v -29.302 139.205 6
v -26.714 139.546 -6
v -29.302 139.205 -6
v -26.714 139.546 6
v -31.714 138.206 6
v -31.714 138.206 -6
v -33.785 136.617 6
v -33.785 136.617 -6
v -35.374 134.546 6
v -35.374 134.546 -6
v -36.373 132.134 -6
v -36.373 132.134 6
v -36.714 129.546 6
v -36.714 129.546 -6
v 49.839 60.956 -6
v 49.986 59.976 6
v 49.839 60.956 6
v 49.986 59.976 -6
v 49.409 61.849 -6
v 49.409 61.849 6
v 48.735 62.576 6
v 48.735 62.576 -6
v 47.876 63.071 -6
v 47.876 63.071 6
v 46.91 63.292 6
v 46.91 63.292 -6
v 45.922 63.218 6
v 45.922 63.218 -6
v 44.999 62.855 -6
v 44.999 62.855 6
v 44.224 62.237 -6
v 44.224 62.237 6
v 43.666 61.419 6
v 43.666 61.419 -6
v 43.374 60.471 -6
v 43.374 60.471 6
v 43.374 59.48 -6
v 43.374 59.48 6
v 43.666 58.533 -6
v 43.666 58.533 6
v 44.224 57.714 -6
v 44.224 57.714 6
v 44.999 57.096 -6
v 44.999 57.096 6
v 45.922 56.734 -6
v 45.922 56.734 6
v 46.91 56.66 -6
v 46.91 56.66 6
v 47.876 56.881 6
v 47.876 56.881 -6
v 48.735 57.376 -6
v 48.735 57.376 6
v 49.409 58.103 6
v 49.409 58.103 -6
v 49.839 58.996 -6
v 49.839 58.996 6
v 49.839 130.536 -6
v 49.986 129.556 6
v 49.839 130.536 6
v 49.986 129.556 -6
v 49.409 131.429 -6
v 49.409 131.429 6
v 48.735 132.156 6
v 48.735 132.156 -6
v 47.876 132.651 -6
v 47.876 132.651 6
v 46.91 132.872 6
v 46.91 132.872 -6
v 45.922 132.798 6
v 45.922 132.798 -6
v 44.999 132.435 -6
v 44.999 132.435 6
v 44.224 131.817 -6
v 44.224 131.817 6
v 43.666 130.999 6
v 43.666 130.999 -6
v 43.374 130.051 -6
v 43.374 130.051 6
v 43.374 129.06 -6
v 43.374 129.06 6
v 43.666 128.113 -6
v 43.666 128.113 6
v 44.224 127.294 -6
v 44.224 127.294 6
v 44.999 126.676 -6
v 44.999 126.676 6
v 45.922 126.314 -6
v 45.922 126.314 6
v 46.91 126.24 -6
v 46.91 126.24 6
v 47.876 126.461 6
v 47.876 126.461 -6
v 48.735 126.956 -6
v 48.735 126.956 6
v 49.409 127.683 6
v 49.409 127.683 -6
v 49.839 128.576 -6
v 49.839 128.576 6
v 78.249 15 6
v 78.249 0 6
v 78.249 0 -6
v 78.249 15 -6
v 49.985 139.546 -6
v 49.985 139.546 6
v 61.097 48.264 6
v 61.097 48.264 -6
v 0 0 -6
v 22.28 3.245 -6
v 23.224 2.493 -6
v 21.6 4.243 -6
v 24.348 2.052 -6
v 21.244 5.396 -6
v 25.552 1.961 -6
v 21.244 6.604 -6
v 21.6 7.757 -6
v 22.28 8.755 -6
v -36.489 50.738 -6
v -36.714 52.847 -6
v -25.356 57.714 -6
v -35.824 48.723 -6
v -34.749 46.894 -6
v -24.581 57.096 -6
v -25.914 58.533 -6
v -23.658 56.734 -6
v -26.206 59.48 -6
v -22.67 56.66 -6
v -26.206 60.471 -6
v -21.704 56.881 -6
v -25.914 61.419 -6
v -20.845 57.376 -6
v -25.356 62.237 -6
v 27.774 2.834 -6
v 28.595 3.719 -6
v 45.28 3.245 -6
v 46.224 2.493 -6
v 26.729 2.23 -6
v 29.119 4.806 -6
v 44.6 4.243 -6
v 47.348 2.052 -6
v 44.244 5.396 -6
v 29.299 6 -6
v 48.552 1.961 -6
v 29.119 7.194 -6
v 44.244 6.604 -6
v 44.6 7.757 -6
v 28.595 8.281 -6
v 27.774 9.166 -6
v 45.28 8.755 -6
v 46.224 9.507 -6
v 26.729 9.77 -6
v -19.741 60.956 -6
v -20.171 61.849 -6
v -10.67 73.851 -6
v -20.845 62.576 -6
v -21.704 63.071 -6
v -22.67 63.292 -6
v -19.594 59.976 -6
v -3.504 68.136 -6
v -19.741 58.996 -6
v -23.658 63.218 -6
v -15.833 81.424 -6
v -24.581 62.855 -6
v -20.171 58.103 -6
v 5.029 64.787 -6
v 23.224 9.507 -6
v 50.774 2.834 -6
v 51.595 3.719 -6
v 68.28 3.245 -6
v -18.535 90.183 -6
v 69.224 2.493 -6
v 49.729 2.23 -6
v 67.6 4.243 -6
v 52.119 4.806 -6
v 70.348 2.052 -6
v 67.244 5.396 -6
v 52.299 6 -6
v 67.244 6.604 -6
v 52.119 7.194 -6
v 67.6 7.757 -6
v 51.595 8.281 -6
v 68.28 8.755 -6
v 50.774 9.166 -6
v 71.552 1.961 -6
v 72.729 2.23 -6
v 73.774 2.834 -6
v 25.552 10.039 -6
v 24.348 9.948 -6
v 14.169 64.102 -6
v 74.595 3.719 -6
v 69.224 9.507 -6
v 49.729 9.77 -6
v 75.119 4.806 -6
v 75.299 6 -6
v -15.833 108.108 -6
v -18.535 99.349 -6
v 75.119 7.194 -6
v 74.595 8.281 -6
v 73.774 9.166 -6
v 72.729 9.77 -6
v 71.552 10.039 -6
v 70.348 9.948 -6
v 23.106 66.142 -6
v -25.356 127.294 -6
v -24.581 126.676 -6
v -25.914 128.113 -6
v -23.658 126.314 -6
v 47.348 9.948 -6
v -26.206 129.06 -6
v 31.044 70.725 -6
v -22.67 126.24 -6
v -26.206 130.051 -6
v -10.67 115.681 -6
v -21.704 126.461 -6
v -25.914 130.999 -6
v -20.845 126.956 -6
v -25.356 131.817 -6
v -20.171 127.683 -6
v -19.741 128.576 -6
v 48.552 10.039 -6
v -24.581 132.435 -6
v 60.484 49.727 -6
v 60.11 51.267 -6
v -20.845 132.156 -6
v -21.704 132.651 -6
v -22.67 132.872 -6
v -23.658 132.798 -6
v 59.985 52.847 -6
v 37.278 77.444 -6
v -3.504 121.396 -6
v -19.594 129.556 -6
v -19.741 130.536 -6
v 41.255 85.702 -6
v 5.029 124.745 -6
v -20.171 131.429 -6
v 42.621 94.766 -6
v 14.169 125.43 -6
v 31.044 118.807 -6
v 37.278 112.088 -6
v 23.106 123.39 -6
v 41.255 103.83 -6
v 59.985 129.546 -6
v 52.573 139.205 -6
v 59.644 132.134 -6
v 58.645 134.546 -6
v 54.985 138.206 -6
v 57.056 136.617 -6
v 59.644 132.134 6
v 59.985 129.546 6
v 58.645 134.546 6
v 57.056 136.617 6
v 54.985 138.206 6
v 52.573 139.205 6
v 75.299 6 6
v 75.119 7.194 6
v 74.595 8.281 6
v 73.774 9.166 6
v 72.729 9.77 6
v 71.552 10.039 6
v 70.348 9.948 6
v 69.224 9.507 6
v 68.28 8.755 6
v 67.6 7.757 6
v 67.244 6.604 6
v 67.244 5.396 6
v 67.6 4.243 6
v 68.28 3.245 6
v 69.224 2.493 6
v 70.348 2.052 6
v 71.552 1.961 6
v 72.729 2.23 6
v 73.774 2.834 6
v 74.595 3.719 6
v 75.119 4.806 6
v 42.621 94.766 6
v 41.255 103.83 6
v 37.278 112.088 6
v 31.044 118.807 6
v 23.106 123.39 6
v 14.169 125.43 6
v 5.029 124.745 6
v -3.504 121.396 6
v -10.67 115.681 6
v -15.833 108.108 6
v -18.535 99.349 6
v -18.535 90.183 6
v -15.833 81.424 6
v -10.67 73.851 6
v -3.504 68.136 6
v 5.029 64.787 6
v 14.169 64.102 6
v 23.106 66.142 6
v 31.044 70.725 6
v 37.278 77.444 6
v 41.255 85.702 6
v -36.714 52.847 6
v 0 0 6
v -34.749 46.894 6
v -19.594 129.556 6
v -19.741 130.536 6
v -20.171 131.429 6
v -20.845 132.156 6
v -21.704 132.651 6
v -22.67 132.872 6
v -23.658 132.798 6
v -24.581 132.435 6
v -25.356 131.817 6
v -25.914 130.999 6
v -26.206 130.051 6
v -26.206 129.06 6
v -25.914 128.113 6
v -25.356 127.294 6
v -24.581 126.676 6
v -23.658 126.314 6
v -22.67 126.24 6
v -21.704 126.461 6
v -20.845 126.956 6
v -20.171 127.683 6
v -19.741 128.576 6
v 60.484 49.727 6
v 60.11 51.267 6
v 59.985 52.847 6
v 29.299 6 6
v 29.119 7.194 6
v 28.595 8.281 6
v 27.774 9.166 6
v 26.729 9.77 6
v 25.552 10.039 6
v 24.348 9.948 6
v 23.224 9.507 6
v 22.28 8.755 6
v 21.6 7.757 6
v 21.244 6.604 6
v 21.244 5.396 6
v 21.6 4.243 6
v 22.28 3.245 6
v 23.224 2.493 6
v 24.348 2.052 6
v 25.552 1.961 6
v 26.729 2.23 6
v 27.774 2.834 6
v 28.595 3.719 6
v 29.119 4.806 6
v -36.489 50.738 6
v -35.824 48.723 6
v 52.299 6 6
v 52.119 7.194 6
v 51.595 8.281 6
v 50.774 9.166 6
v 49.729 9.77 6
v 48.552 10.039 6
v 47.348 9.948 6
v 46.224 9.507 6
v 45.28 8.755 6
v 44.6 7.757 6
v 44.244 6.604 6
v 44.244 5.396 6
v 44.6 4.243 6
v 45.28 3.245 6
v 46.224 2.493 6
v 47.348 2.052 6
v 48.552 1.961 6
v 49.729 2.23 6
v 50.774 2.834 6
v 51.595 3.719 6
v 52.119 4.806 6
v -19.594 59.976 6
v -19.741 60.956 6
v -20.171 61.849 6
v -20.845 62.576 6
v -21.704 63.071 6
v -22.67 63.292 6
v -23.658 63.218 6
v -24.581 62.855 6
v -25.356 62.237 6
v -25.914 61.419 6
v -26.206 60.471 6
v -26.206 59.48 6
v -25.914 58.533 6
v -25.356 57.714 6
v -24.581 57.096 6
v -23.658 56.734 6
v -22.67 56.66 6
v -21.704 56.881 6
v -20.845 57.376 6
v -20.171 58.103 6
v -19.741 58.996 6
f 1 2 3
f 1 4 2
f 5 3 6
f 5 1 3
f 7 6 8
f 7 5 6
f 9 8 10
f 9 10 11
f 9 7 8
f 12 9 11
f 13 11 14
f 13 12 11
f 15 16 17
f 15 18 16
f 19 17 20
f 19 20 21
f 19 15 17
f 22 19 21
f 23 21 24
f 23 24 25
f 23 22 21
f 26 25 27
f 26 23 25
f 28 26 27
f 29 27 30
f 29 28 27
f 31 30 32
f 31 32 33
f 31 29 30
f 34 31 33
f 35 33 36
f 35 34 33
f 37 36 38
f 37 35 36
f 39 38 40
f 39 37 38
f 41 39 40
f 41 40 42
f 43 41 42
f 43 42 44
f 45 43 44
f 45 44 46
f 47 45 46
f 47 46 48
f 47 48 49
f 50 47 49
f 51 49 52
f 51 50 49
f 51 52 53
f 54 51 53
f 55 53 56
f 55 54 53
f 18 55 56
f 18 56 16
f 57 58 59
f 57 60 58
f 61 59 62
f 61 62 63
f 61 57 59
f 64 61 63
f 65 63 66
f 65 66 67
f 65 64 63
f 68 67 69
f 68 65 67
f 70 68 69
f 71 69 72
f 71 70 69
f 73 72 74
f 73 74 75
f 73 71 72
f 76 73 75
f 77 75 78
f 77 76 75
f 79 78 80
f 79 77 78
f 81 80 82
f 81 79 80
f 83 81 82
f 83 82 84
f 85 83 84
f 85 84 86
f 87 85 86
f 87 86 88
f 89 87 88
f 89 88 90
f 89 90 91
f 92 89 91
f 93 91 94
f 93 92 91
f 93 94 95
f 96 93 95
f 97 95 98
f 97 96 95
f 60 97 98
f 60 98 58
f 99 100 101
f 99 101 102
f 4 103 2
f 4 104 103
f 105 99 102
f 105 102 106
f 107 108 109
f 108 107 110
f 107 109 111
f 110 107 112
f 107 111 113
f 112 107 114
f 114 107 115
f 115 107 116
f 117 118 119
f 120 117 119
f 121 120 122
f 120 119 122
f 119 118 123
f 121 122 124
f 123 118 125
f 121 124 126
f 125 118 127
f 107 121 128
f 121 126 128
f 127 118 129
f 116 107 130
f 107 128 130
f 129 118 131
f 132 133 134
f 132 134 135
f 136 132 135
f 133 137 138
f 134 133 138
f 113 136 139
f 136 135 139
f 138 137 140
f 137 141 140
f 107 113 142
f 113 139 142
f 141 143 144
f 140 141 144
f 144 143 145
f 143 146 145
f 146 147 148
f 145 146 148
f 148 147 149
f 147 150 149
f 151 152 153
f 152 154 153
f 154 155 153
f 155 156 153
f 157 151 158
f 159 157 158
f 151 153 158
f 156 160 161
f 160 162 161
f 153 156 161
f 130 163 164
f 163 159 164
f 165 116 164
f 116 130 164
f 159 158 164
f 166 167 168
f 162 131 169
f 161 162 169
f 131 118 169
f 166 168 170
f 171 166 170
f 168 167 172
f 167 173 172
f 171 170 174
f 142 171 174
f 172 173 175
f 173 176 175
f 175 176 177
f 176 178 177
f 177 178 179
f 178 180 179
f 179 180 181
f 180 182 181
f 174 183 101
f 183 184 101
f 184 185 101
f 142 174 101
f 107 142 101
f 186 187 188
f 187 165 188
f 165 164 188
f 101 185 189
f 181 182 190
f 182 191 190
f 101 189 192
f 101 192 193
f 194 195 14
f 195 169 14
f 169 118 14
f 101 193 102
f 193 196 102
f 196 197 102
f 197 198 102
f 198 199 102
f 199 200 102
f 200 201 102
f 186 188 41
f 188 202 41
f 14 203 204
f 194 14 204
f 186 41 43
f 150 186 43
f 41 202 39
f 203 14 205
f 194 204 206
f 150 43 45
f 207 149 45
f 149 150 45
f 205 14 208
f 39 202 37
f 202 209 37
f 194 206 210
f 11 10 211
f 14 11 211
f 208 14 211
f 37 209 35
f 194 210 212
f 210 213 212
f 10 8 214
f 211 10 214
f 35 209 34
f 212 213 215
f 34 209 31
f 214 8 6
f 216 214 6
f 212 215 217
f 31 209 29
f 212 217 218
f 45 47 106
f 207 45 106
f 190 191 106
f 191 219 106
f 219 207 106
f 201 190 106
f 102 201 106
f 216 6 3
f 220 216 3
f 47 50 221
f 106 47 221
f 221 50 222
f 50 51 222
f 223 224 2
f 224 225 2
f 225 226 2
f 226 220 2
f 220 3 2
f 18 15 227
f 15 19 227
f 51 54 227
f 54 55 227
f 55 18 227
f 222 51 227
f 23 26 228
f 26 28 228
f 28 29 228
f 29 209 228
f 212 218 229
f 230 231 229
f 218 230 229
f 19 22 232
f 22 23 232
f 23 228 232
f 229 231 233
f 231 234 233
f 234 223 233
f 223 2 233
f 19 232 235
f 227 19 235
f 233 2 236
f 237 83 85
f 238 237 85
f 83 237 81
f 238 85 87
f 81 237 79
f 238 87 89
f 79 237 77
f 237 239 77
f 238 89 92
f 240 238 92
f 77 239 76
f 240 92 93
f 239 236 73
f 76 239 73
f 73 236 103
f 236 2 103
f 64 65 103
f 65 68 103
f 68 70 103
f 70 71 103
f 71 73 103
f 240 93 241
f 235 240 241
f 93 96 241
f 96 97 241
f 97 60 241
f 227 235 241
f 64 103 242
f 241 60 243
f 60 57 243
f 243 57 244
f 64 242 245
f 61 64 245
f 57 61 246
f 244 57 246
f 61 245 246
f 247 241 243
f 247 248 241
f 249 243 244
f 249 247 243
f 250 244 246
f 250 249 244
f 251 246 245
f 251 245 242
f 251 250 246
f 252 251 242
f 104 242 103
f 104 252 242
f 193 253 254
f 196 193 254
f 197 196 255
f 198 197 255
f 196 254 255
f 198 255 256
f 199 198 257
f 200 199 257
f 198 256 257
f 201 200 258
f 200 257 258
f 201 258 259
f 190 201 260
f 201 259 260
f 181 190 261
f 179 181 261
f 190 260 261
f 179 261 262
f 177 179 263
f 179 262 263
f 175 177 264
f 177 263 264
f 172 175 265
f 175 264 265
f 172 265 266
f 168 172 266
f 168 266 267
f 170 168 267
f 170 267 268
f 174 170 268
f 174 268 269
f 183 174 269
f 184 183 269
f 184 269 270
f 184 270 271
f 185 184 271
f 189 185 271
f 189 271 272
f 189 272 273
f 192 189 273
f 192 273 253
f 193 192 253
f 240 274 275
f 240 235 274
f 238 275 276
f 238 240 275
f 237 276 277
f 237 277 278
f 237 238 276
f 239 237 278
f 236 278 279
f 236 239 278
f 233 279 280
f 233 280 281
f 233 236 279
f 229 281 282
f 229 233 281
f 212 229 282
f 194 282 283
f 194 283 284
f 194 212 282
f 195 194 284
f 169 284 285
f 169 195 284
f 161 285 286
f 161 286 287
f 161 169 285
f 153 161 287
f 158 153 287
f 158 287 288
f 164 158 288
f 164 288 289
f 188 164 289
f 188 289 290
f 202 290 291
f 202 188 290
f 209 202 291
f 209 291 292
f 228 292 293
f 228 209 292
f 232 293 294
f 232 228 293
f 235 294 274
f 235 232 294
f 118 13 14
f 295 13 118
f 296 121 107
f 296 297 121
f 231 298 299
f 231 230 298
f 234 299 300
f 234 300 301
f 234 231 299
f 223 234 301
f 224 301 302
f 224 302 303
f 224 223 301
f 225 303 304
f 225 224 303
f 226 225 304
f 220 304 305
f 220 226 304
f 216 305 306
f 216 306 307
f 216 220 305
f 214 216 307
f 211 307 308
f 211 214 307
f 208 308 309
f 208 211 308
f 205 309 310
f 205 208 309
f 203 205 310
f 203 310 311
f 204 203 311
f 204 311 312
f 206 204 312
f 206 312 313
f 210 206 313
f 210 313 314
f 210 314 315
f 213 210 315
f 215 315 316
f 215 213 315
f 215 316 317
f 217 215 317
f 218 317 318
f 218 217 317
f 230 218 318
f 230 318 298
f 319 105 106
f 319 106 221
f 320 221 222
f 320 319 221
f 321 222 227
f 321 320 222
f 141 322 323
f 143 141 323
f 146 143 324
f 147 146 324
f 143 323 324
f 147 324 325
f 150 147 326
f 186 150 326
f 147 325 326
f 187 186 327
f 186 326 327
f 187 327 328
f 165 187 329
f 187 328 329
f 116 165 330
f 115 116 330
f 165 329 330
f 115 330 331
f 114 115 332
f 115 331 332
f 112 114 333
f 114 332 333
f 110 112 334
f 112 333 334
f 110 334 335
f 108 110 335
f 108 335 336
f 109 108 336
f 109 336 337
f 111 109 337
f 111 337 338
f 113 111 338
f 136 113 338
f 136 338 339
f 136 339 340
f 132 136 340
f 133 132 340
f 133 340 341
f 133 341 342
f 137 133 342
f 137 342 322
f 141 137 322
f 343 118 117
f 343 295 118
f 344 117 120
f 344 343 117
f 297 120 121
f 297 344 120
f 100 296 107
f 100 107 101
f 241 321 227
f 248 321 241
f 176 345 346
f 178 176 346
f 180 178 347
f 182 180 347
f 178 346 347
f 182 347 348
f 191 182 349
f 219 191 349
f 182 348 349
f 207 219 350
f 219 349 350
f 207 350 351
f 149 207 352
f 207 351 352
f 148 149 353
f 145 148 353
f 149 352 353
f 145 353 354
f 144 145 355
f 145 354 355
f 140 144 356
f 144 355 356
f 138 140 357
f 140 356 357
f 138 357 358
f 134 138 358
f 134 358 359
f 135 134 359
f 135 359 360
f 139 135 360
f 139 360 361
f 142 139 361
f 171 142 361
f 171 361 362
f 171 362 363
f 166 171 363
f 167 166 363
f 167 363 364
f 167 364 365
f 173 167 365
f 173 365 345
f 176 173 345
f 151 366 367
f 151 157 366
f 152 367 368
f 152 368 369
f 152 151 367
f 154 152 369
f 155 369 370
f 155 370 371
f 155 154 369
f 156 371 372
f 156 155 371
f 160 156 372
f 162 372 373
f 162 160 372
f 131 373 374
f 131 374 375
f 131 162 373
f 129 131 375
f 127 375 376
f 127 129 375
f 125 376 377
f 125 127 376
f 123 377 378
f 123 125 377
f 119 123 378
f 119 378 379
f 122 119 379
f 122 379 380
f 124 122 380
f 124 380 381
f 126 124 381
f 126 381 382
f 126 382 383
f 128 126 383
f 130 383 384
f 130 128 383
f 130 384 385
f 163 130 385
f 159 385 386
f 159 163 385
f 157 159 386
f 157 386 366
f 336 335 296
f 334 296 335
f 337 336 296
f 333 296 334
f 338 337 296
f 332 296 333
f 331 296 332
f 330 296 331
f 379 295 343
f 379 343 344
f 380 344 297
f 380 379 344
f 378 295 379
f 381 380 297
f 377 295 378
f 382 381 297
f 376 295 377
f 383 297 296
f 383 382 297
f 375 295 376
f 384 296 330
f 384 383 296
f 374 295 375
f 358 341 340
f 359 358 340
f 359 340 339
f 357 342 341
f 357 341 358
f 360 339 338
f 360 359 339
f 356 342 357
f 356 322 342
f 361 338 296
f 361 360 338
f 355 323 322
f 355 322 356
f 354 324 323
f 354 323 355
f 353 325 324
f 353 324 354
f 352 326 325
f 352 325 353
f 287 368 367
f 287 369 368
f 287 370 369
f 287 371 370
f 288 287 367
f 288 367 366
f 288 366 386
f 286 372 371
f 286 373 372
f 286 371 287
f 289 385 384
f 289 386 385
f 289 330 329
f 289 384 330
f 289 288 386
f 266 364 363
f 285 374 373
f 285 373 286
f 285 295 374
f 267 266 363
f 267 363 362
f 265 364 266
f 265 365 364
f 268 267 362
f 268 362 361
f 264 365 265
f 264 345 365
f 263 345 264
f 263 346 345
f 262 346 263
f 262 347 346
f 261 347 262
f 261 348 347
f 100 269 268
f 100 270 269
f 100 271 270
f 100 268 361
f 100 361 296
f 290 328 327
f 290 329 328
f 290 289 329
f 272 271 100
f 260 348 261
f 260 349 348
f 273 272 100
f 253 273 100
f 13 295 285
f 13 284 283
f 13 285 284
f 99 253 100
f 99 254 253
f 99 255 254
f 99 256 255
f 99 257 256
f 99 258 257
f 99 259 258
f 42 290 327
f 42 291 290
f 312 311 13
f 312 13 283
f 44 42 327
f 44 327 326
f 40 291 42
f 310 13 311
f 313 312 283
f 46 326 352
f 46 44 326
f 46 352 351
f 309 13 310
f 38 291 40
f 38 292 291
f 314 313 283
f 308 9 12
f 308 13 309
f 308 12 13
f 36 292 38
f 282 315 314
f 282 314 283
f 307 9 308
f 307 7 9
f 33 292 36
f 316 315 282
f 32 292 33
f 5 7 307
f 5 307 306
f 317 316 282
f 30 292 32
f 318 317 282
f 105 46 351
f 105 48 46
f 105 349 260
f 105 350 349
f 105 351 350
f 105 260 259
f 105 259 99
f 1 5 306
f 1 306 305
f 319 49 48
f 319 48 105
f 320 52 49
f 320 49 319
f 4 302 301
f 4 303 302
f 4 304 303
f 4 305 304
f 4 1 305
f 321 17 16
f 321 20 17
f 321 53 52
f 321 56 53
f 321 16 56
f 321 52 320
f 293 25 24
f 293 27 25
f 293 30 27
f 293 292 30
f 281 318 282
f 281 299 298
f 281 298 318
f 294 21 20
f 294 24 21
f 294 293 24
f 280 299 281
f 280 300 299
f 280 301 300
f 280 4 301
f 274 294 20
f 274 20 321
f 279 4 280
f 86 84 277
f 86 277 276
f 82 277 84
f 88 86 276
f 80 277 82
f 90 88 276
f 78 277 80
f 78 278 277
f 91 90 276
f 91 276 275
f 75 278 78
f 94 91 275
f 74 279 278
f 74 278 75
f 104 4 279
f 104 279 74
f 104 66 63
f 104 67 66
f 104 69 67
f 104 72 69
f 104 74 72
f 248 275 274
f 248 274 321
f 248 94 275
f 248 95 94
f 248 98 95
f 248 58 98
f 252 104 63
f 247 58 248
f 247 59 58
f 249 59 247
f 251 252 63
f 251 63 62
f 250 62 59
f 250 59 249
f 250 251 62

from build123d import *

# Parameters (mm, degrees)
SKETCH1_R           = 30.75
SKETCH1_R_2         = 3.325
BOSS_EXTRUDE1_DEPTH = 6
SKETCH2_R           = 4.05
CUT_EXTRUDE1_DEPTH  = 161.436981194
LPATTERN1_COUNT     = 3
LPATTERN1_PITCH     = 23


with BuildPart() as part:
    # Sketch1 → Boss-Extrude1 (new, symmetric)
    with BuildSketch(Plane.XY):
        with BuildLine():
            Line((-34.748577527, 46.893721429), (0, 0))
            Line((0, 0), (78.24898238, 0))
            Line((78.24898238, 0), (78.24898238, 15))
            Line((78.24898238, 15), (61.096720235, 48.264425218))
            ThreePointArc((61.096720235, 48.264425218), (60.266695593, 50.489412932), (59.984720032, 52.847378372))
            Line((59.984720032, 52.847378372), (59.984720032, 129.546127467))
            ThreePointArc((59.984720032, 129.546127467), (57.055787843, 136.617195279), (49.984720032, 139.546127467))
            Line((49.984720032, 139.546127467), (-26.714029064, 139.546127467))
            ThreePointArc((-26.714029064, 139.546127467), (-33.785096876, 136.617195279), (-36.714029064, 129.546127467))
            Line((-36.714029064, 129.546127467), (-36.714029064, 52.847378372))
            ThreePointArc((-36.714029064, 52.847378372), (-36.209961999, 49.712532653), (-34.748577527, 46.893721429))
        make_face()
        with Locations((11.87148929, 94.76591255)):
            Circle(SKETCH1_R, mode=Mode.SUBTRACT)
        with Locations((46.66148929, 129.55591255)):
            Circle(SKETCH1_R_2, mode=Mode.SUBTRACT)
        with Locations((46.66148929, 59.97591255)):
            Circle(SKETCH1_R_2, mode=Mode.SUBTRACT)
        with Locations((-22.91851071, 59.97591255)):
            Circle(SKETCH1_R_2, mode=Mode.SUBTRACT)
        with Locations((-22.91851071, 129.55591255)):
            Circle(SKETCH1_R_2, mode=Mode.SUBTRACT)
    extrude(amount=BOSS_EXTRUDE1_DEPTH, both=True)

    # Sketch2 → Cut-Extrude1 (cut, through all)
    with BuildSketch(Plane.XY.offset(6)):
        with Locations((71.24898238, 6)):
            Circle(SKETCH2_R)
    cut_extrude1 = extrude(amount=-CUT_EXTRUDE1_DEPTH, mode=Mode.SUBTRACT)

    # LPattern1: Cut-Extrude1 ×3
    with Locations(*[(-i * LPATTERN1_PITCH, 0, 0) for i in range(1, LPATTERN1_COUNT)]):
        add(cut_extrude1, mode=Mode.SUBTRACT)


solid = part.part
